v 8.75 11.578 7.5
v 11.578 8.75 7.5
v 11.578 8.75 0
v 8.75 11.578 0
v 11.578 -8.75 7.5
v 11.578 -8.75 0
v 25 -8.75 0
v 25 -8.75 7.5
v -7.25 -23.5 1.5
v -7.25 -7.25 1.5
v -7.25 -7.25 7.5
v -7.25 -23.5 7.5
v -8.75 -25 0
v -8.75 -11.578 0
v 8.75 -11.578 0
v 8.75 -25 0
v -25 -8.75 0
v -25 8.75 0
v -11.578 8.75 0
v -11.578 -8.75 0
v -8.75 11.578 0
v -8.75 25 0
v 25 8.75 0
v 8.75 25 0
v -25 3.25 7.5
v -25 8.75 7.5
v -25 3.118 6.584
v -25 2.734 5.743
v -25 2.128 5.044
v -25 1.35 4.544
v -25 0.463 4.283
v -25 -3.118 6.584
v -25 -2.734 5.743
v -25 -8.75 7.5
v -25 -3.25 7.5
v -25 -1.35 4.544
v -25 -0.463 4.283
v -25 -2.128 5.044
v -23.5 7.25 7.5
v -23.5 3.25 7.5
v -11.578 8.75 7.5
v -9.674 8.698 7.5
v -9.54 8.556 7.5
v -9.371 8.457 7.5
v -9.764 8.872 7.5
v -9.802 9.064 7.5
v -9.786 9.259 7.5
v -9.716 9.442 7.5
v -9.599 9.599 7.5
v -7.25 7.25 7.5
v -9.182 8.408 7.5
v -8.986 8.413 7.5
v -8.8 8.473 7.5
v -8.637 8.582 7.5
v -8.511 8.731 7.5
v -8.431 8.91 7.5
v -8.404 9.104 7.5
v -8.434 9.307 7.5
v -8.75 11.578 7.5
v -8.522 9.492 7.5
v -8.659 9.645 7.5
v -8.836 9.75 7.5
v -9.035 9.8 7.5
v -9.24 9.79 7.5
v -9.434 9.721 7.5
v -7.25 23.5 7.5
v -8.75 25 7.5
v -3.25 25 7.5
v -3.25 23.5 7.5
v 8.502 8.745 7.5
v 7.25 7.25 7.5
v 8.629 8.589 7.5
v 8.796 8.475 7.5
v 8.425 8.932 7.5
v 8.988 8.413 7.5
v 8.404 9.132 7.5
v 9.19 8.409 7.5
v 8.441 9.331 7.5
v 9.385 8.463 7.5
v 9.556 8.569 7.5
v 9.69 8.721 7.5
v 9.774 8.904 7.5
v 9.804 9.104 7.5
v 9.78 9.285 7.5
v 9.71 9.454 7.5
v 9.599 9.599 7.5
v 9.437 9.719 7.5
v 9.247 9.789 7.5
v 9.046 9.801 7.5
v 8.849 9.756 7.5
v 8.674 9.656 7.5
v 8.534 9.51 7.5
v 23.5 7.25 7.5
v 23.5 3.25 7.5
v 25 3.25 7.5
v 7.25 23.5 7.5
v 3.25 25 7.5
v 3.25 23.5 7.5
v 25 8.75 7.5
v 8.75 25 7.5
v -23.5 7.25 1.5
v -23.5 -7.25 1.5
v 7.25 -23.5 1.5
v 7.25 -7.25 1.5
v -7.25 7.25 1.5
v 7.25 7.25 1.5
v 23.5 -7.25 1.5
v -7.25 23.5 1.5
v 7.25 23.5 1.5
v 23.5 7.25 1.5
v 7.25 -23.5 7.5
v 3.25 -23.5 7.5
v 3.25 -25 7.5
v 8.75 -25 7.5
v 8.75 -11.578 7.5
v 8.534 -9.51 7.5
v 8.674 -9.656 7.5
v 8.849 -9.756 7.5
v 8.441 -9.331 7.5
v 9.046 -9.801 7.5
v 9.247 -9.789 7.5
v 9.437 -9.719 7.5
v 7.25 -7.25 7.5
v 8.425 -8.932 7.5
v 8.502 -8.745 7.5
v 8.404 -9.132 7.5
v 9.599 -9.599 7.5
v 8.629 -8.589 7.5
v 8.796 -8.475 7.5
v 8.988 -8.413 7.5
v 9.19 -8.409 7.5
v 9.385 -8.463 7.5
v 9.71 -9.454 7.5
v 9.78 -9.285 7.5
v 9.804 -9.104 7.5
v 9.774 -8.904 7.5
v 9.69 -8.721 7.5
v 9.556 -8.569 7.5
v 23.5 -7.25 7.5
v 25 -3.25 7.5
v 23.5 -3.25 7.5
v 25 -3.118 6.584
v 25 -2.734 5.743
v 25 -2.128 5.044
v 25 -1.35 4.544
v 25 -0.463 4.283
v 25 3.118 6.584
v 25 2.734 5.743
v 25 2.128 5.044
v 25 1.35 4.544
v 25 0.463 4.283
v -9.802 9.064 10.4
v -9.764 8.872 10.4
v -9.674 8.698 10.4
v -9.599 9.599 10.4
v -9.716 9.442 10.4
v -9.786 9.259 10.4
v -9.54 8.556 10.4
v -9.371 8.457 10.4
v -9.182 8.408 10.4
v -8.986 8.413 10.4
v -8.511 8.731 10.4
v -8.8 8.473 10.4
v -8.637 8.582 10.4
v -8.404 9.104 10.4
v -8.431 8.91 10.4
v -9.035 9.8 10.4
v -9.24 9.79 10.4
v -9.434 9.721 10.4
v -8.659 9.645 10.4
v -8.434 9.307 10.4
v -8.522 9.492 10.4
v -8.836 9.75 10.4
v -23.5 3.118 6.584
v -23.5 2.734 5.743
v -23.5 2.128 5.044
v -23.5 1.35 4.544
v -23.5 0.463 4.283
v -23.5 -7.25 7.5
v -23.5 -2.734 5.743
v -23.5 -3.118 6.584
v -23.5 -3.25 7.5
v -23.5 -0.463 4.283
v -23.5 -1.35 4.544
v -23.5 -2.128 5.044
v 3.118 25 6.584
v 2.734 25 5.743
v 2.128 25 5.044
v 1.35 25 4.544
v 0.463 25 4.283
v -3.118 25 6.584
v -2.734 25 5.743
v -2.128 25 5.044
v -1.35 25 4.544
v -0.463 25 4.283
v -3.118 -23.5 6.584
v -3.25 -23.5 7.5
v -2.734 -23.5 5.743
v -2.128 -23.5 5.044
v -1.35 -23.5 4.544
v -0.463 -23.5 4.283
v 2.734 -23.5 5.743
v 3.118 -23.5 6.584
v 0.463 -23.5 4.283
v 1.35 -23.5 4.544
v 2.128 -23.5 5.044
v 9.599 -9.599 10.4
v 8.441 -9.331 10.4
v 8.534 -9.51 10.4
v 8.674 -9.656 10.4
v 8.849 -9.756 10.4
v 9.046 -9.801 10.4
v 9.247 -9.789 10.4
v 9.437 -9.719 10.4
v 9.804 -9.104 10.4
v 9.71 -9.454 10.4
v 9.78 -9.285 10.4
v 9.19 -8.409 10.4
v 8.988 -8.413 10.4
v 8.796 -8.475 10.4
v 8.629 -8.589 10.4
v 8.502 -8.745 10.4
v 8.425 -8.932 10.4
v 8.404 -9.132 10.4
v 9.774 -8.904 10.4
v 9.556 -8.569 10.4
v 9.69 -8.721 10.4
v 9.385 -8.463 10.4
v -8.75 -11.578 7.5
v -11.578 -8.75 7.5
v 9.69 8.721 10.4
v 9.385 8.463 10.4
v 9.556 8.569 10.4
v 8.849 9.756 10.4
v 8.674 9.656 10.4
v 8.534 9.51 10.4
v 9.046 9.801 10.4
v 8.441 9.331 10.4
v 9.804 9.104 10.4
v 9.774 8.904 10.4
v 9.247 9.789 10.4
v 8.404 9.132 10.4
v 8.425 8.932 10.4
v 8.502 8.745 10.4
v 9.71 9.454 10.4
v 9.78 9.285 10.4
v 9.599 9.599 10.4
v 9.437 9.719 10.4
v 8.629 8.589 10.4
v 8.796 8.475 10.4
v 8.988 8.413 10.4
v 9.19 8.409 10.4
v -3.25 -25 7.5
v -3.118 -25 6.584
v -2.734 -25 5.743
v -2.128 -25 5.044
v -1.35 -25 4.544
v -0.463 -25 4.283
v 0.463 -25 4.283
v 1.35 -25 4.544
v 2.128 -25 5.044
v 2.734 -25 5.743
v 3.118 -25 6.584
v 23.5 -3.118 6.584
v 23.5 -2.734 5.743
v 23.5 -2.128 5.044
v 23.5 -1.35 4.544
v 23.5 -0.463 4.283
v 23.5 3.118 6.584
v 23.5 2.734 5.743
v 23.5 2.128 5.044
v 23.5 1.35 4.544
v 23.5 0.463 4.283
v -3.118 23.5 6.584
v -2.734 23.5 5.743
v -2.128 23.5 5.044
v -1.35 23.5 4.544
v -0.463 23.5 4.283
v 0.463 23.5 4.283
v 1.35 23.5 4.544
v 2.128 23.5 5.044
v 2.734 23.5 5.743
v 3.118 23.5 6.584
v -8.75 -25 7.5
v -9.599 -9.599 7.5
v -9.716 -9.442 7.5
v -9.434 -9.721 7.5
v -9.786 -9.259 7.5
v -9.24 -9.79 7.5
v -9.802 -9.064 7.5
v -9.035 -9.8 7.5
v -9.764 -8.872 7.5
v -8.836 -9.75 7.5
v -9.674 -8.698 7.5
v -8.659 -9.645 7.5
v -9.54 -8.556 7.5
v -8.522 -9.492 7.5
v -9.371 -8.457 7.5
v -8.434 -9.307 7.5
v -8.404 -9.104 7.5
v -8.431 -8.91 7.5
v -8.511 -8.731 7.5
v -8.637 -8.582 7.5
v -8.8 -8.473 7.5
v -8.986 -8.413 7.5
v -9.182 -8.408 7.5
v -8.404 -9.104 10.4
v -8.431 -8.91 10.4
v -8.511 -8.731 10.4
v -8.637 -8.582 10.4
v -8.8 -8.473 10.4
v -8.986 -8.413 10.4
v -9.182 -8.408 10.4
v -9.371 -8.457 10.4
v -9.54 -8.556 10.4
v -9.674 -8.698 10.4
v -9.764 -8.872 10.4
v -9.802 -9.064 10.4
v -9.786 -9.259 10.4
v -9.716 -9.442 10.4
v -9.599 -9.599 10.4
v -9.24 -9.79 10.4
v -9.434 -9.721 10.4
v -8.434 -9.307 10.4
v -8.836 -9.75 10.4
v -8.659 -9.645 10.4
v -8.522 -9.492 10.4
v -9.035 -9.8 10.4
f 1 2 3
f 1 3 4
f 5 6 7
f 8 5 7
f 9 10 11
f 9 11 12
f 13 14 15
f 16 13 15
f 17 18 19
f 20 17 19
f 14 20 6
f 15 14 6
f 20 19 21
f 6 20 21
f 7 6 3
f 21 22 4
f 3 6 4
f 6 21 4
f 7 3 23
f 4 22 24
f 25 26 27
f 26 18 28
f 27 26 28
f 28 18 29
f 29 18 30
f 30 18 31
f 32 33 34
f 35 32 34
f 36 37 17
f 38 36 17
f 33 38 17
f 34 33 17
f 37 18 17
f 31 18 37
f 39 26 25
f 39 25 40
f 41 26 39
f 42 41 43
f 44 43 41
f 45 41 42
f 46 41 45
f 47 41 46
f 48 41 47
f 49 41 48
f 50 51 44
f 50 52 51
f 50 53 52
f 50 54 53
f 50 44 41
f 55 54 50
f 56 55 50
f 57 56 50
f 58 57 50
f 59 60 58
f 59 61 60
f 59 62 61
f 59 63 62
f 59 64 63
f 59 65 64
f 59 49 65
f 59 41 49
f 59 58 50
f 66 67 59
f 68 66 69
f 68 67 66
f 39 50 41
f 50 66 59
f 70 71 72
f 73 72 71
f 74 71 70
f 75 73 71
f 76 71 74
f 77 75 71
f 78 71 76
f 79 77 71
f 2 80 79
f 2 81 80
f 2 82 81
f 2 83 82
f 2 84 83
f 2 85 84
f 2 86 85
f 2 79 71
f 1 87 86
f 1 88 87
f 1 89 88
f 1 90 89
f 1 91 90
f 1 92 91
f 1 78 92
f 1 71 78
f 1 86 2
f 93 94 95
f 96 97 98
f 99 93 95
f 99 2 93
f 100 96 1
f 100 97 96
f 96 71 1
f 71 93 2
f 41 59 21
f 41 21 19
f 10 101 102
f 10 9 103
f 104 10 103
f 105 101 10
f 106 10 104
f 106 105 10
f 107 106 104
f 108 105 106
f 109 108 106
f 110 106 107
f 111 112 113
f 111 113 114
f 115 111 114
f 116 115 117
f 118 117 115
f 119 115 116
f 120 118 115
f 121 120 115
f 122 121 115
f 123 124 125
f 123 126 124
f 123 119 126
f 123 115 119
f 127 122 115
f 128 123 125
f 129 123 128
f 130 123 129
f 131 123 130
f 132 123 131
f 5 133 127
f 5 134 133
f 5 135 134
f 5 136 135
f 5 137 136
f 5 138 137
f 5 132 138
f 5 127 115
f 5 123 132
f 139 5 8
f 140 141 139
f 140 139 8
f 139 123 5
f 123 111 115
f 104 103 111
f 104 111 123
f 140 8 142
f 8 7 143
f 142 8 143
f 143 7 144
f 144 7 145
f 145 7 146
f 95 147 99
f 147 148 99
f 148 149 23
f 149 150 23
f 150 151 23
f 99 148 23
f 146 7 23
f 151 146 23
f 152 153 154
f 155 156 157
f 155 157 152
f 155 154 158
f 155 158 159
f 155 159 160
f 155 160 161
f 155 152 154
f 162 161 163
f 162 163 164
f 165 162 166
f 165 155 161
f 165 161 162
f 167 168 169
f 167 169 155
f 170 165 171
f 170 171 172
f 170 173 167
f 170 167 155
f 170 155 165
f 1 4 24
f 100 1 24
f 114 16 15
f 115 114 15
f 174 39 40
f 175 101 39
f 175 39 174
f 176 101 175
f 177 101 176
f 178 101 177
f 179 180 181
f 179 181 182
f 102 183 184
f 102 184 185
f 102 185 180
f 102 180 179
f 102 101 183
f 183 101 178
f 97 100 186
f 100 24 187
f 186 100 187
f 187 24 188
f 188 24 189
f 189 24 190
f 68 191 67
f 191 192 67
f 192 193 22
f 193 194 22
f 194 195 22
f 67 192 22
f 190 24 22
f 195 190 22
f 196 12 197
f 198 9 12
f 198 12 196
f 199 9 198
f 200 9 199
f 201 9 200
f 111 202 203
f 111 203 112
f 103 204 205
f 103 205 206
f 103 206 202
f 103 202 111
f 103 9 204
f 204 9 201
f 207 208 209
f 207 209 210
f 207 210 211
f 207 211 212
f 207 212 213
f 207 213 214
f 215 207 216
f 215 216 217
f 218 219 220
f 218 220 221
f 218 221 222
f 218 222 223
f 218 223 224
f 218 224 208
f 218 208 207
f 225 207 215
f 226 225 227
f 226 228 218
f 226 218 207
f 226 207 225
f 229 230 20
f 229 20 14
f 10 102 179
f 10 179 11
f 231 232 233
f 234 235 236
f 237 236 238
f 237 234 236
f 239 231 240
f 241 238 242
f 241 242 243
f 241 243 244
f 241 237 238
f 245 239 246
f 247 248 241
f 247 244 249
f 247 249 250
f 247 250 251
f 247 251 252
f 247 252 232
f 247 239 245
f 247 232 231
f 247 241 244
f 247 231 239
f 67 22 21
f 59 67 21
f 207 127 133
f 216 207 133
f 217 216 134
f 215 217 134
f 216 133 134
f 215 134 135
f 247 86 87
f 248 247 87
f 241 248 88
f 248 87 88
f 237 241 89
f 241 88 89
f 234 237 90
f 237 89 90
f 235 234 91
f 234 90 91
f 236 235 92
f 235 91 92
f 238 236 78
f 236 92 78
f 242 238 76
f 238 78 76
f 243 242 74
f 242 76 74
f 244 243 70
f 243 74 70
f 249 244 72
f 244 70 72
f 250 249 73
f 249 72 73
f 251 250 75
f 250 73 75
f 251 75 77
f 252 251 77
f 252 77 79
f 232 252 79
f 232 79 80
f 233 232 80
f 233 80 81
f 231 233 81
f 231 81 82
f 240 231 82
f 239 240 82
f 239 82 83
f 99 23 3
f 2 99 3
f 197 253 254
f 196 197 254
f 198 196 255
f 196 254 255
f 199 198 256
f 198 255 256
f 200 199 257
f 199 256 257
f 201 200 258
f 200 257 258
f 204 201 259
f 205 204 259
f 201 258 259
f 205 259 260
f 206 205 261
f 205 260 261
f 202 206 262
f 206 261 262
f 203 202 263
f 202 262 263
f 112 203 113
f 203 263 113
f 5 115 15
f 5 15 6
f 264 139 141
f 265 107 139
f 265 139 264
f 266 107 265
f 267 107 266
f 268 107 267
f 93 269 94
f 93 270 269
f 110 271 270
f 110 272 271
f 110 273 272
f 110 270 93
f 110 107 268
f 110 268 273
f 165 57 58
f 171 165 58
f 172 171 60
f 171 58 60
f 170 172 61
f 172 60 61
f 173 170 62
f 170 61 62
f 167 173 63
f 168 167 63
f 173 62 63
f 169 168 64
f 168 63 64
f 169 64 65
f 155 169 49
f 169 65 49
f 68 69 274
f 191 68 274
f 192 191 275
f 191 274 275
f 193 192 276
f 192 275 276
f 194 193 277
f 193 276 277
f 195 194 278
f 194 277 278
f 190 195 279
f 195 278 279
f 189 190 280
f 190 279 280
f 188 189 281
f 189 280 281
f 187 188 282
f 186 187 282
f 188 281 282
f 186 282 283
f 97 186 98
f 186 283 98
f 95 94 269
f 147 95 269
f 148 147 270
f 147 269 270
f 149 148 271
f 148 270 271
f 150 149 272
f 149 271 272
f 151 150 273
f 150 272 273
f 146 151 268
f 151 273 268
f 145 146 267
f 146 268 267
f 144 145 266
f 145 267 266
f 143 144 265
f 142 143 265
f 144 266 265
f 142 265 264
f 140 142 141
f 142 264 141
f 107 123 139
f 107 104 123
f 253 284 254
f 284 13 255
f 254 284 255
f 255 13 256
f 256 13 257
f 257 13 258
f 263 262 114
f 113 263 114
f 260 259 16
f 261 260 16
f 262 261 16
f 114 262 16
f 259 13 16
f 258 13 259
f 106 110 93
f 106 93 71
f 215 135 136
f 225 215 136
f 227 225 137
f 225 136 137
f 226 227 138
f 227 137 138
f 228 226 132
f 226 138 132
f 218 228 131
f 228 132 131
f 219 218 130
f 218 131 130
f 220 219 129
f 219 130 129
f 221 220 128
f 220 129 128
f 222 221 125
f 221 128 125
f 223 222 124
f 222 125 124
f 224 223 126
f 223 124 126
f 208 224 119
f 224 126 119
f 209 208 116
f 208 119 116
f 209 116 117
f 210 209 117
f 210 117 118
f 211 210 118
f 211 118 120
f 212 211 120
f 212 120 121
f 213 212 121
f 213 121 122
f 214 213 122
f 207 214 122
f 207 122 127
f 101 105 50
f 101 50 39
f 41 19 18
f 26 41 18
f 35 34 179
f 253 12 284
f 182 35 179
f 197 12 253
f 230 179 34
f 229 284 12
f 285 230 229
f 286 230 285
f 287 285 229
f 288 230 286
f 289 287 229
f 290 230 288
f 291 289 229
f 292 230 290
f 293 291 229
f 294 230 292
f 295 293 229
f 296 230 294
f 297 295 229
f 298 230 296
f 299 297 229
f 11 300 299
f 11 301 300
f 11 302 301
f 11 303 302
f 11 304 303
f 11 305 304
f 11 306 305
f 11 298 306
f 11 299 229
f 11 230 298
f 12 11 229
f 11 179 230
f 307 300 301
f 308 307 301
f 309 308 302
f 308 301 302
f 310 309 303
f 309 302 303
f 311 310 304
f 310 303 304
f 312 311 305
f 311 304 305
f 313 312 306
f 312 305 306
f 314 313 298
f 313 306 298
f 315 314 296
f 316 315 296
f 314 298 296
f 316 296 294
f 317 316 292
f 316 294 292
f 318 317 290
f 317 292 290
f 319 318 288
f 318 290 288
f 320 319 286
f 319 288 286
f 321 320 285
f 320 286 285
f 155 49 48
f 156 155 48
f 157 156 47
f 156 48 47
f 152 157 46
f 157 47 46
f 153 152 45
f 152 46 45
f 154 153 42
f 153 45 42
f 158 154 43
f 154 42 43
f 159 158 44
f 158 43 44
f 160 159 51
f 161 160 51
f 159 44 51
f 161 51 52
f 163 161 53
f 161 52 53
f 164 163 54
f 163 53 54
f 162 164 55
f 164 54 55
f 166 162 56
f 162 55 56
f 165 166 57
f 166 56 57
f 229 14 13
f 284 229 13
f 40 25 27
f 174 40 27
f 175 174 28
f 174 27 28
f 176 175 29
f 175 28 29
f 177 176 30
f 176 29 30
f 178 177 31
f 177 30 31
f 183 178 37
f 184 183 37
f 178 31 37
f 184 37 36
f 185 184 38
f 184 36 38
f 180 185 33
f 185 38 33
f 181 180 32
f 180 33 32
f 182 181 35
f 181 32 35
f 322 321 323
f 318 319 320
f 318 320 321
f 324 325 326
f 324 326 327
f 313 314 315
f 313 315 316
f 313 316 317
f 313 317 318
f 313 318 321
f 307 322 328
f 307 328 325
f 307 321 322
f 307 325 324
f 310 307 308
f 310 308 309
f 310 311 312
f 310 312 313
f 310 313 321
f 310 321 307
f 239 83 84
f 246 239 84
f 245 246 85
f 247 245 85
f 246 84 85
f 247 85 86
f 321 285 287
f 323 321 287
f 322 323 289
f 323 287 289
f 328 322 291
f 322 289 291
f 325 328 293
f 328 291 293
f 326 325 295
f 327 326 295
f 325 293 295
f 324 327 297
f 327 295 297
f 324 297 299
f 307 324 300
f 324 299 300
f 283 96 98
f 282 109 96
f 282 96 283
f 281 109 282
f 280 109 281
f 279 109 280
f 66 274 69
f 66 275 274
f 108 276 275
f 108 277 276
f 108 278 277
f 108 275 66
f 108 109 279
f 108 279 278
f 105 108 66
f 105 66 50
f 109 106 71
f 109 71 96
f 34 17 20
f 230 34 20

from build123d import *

# Parameters (mm, degrees)
F1_DEPTH  = 7.5
F2_T      = -1.5
F4_DEPTH  = 7.5
F6_DEPTH  = 2.9
F7_R      = 3.25
F8_DEPTH  = 50.001
F9_R      = 3.25
F10_DEPTH = 50.001


with BuildPart() as f1:
    # F0 (on Top) → F1 (new body)
    with BuildSketch(Plane.XY):
        Polygon((25, -8.75), (25, 8.75), (8.75, 8.75), (8.75, 25), (-8.75, 25), (-8.75, 8.75), (-25, 8.75), (-25, -8.75), (-8.75, -8.75), (-8.75, -25), (8.75, -25), (8.75, -8.75), align=None)
    extrude(amount=F1_DEPTH)

    # F2
    f2_openings = [f1.faces().sort_by_distance(p)[0] for p in [
        (0, 0, 7.5),
    ]]
    offset(amount=F2_T, openings=f2_openings, kind=Kind.INTERSECTION)

    # F3 (on face) → F4 (join, through all)
    with BuildSketch(Plane.XY.offset(7.5)):
        Polygon((-8.75, 11.5784271247), (-11.5784271247, 8.75), (-8.75, 8.75), align=None)
        Polygon((8.75, 11.5784271247), (8.75, 8.75), (11.5784271247, 8.75), align=None)
        Polygon((-8.75, -11.5784271247), (-8.75, -8.75), (-11.5784271247, -8.75), align=None)
        Polygon((11.5784271247, -8.75), (8.75, -8.75), (8.75, -11.5784271247), align=None)
    extrude(amount=-F4_DEPTH)

    # F5 (on face) → F6 (join)
    with BuildSketch(Plane.XY.offset(7.5)):
        with BuildLine():
            ThreePointArc((-9.5985281374, 9.5985281374), (-9.3714317932, 8.4568377178), (-8.4035533906, 9.1035533906))
            ThreePointArc((-8.4035533906, 9.1035533906), (-8.8356749879, 9.7502690634), (-9.5985281374, 9.5985281374))
        make_face()
        with BuildLine():
            ThreePointArc((9.5985281374, 9.5985281374), (8.4568377178, 8.8356749879), (9.8035533906, 9.1035533906))
            ThreePointArc((9.8035533906, 9.1035533906), (9.7502690634, 9.3714317932), (9.5985281374, 9.5985281374))
        make_face()
        with BuildLine():
            ThreePointArc((9.5985281374, -9.5985281374), (9.7502690634, -9.3714317932), (9.8035533906, -9.1035533906))
            ThreePointArc((9.8035533906, -9.1035533906), (8.4568377178, -8.8356749879), (9.5985281374, -9.5985281374))
        make_face()
        with BuildLine():
            ThreePointArc((-9.5985281374, -9.5985281374), (-8.8356749879, -9.7502690634), (-8.4035533906, -9.1035533906))
            ThreePointArc((-8.4035533906, -9.1035533906), (-9.3714317932, -8.4568377178), (-9.5985281374, -9.5985281374))
        make_face()
    extrude(amount=F6_DEPTH)

    # F7 (on face) → F8 (cut, through all)
    with BuildSketch(Plane.XZ.offset(25)):
        with Locations((0, 7.5)):
            Circle(F7_R)
    extrude(amount=-F8_DEPTH, mode=Mode.SUBTRACT)

    # F9 (on face) → F10 (cut, through all)
    with BuildSketch(Plane(origin=(-25, 0, 0), x_dir=(0, -1, 0), z_dir=(-1, 0, 0))):
        with Locations((0, 7.5)):
            Circle(F9_R)
    extrude(amount=-F10_DEPTH, mode=Mode.SUBTRACT)


solid = f1.part
